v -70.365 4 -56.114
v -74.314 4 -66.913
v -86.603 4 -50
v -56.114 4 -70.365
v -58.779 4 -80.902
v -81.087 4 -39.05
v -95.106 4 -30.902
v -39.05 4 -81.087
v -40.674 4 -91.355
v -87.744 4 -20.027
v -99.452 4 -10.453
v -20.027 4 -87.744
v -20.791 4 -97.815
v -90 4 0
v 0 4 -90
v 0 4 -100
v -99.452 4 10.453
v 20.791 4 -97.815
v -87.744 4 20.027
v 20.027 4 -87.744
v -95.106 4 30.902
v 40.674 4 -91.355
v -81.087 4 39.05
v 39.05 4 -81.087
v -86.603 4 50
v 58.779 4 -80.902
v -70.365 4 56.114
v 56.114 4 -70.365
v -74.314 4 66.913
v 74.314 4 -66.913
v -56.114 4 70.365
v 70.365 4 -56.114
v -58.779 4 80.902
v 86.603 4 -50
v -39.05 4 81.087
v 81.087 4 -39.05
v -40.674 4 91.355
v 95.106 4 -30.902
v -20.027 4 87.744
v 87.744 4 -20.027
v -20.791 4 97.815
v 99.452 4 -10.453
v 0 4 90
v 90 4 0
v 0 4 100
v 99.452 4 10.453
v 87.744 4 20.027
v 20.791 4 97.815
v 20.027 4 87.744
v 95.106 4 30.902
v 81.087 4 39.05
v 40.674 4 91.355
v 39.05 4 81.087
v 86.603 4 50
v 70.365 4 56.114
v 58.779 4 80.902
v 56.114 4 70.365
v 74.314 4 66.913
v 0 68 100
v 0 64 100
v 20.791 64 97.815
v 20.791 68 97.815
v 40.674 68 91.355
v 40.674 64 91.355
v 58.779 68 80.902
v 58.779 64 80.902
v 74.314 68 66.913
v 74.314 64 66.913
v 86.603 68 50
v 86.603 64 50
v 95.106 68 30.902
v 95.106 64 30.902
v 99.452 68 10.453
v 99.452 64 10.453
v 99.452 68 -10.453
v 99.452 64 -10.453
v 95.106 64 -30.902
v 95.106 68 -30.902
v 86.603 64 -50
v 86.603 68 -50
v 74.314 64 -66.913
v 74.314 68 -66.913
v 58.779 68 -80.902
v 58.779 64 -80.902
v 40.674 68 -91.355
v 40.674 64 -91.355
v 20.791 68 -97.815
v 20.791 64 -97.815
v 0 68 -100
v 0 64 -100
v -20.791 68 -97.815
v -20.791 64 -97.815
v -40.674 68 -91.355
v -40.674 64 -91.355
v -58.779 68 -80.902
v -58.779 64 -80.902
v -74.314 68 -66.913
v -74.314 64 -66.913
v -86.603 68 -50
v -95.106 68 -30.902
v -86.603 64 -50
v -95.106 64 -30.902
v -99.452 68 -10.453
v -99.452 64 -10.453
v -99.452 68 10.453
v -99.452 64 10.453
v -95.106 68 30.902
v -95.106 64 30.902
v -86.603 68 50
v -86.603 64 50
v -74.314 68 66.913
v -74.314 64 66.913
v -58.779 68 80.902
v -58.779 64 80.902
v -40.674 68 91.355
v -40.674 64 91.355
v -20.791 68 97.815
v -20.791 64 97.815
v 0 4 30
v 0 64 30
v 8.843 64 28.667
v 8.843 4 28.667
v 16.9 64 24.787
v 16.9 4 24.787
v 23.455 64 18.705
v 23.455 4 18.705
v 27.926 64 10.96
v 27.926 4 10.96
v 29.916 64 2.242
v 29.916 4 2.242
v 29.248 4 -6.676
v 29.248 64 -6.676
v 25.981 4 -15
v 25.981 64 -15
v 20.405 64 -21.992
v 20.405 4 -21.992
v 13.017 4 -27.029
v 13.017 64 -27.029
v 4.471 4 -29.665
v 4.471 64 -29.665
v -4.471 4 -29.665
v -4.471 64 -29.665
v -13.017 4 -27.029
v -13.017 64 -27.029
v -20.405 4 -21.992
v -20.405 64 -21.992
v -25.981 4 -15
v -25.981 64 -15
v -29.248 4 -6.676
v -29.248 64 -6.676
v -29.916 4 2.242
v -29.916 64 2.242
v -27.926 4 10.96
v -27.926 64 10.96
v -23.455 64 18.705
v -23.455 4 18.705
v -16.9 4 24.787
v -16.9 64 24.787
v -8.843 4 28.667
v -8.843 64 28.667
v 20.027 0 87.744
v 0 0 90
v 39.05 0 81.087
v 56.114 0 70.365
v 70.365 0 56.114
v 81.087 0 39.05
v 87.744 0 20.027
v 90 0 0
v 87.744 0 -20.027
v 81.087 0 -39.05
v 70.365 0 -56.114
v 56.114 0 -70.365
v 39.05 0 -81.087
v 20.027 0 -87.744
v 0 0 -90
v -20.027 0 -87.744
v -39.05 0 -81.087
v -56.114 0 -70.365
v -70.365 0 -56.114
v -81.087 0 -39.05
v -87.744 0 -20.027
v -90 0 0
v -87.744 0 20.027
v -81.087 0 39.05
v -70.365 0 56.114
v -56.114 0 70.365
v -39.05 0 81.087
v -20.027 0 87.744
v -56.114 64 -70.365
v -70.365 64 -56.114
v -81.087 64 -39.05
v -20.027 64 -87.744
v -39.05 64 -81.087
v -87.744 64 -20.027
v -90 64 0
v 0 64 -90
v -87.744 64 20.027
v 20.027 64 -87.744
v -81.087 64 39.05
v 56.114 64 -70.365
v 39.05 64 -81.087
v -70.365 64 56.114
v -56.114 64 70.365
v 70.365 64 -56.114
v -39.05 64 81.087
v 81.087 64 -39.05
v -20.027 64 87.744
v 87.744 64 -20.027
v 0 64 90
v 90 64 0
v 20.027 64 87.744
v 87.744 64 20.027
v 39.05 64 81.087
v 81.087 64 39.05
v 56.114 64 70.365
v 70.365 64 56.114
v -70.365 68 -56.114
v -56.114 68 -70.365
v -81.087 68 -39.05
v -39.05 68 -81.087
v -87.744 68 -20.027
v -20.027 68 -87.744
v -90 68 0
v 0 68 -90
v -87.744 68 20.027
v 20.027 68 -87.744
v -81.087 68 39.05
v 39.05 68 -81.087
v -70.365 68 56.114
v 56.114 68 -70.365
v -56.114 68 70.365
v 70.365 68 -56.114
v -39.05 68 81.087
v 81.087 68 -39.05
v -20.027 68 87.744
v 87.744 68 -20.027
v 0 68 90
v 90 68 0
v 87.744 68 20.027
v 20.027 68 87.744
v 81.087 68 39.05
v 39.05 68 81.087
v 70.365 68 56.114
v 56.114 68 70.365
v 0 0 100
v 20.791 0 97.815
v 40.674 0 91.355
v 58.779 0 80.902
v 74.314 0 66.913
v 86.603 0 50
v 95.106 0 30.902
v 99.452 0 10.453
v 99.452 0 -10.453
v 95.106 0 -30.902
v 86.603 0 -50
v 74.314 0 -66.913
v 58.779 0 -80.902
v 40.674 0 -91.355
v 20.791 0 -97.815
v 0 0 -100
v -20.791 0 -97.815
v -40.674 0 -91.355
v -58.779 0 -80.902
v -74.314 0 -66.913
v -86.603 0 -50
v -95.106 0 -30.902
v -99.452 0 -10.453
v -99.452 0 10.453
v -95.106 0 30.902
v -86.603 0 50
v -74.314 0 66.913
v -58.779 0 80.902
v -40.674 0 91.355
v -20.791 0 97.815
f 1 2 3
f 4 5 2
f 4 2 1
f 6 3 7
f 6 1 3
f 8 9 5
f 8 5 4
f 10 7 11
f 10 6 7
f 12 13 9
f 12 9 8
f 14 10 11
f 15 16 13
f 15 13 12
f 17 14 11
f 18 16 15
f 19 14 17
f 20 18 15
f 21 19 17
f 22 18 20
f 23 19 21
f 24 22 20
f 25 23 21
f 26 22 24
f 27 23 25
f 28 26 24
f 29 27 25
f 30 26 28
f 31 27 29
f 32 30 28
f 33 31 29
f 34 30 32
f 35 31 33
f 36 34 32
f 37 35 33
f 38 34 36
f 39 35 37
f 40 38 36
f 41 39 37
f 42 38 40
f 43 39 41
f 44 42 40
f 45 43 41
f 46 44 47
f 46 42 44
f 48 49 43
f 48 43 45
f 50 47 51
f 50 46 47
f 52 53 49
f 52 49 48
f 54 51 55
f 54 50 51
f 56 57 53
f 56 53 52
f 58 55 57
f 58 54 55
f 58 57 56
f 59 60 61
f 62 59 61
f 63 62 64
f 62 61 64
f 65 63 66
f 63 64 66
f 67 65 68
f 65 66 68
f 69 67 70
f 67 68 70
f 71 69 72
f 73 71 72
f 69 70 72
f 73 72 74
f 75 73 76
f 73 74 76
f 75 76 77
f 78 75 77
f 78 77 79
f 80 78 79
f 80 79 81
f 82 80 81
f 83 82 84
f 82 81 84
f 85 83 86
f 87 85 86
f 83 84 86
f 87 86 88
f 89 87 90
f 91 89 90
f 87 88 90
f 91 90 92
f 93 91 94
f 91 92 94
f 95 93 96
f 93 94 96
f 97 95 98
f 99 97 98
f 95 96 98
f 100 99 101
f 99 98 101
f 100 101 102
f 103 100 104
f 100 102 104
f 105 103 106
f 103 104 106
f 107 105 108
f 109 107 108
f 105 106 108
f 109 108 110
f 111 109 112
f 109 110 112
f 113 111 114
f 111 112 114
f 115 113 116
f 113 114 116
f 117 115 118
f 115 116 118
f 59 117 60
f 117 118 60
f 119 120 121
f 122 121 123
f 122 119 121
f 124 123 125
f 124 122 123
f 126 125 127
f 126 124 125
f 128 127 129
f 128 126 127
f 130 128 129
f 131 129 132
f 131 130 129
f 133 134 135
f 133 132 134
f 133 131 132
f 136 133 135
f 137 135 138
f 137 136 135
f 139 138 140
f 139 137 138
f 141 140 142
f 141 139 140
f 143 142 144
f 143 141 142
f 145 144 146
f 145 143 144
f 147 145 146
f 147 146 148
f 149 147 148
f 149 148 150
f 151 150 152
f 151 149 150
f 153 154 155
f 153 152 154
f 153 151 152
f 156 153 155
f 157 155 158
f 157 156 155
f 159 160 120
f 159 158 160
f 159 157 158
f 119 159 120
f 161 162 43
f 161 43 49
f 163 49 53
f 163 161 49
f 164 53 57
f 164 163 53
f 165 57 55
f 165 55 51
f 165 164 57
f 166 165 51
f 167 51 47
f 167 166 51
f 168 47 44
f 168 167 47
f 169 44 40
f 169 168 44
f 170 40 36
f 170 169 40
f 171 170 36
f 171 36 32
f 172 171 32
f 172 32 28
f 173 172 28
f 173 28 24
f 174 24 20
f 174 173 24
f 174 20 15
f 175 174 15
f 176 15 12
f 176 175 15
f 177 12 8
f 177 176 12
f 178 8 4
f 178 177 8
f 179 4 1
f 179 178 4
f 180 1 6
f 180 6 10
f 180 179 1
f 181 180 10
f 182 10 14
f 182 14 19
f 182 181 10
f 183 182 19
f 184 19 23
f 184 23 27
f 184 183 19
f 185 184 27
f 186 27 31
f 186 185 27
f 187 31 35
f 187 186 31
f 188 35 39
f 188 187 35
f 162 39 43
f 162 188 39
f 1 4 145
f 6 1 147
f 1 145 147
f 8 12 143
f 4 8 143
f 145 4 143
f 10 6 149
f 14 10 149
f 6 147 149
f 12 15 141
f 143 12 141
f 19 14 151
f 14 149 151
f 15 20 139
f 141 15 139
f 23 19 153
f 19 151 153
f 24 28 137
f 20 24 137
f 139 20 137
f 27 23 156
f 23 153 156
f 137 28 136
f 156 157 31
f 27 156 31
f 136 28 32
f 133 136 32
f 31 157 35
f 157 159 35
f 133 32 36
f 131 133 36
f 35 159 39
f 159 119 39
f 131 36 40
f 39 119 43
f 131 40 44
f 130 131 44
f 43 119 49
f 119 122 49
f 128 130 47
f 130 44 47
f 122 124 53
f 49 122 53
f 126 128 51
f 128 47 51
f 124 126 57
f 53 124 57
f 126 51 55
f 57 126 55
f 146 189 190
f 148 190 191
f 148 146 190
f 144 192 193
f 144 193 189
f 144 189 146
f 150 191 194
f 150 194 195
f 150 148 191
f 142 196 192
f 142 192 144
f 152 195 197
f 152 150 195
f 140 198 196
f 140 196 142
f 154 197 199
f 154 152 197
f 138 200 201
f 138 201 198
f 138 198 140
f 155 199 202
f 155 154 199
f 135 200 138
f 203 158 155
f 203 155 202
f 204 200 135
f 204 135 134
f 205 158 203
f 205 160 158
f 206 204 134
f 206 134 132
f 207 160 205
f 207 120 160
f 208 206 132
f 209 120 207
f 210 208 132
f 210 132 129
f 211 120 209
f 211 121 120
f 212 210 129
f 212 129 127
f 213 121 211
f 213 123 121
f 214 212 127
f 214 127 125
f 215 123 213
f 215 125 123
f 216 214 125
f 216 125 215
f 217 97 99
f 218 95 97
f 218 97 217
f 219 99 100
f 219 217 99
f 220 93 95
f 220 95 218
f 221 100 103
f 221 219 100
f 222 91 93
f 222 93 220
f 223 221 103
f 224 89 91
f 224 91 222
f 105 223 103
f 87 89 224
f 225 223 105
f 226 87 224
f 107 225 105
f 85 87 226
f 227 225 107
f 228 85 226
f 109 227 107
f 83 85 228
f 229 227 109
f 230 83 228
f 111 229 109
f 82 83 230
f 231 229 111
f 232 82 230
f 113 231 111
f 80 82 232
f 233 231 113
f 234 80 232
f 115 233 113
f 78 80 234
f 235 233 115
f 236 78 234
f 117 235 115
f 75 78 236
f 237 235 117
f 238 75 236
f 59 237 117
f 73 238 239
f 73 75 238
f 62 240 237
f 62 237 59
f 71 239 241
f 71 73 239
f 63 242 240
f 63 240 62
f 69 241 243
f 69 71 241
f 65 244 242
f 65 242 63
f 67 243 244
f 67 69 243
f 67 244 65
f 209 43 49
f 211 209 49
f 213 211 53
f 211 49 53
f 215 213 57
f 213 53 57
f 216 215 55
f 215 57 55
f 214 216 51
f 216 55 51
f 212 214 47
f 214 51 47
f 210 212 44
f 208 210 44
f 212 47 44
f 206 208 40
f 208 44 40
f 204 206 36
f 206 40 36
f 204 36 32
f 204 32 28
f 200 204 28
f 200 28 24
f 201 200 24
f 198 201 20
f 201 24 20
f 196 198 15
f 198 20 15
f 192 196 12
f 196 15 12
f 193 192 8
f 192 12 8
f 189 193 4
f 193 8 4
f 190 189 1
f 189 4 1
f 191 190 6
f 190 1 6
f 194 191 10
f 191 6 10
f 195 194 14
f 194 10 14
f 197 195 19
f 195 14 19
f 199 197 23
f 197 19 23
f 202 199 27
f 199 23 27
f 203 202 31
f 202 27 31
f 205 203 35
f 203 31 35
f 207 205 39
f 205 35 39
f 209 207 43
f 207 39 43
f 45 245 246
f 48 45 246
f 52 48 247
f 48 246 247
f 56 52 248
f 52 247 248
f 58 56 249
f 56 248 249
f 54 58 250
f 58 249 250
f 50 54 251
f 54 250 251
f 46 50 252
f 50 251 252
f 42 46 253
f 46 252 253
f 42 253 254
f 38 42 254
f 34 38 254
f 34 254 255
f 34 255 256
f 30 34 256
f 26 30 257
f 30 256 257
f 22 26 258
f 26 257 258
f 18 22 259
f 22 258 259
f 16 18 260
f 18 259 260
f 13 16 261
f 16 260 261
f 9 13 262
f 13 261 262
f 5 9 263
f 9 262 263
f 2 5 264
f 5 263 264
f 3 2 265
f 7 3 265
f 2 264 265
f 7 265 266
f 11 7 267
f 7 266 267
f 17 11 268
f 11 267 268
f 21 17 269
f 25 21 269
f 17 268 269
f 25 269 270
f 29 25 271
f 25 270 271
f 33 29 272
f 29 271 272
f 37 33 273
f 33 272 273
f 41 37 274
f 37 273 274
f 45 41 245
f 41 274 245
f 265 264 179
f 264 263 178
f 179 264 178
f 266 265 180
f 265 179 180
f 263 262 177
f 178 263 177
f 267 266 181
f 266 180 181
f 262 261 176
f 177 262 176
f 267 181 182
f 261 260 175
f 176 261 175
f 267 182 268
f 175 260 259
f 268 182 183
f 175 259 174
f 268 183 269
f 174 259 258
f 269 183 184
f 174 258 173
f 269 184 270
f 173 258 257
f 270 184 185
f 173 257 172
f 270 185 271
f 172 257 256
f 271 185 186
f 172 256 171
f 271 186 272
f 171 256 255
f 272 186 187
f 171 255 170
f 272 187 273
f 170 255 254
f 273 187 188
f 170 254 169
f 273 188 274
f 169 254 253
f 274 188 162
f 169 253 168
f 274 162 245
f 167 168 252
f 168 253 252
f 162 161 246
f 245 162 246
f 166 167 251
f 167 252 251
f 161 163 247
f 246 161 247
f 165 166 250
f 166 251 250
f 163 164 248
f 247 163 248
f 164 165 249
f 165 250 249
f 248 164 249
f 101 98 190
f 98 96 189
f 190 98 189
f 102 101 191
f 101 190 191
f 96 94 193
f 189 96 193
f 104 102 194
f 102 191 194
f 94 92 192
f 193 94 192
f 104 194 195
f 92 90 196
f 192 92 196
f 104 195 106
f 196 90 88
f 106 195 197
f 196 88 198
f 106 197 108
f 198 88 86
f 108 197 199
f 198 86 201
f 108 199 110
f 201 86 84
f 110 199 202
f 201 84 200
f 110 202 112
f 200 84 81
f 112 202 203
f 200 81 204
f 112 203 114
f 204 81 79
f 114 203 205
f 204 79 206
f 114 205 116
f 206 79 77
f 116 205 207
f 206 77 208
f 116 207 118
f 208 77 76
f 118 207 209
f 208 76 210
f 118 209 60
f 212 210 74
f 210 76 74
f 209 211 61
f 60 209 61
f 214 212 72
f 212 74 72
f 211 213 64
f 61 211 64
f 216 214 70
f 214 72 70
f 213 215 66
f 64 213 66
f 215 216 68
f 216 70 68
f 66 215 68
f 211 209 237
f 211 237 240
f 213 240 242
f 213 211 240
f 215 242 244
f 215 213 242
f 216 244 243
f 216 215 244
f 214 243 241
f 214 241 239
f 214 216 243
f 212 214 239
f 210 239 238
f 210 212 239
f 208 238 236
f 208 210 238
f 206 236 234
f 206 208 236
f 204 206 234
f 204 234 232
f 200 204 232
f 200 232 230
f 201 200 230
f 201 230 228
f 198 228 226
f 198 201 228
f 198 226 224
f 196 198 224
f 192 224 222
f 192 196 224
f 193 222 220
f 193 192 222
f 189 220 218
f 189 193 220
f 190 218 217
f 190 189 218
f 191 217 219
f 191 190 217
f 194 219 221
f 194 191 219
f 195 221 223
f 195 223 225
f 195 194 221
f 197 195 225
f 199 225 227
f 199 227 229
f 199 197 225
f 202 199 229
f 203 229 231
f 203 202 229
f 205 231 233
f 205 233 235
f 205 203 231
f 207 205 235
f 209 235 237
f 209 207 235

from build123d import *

# Parameters (mm, degrees)
SKETCH1_R           = 100
SKETCH1_R_2         = 90
BOSS_EXTRUDE1_DEPTH = 4
SKETCH2_R           = 90
SKETCH2_R_2         = 30
BOSS_EXTRUDE2_DEPTH = 60
SKETCH3_R           = 100
SKETCH3_R_2         = 30
BOSS_EXTRUDE3_DEPTH = 4
CUT_EXTRUDE1_START  = -4
SKETCH4_R           = 90
CUT_EXTRUDE1_DEPTH  = 4


with BuildPart() as part:
    # Sketch1 → Boss-Extrude1 (new body)
    with BuildSketch(Plane(origin=(0, 0, 0), x_dir=(1, 0, 0), z_dir=(0, 1, 0))):
        with Locations(Location((0, 0, 0), (0, 0, 270))):
            Circle(SKETCH1_R)
        with Locations(Location((0, 0, 0), (0, 0, 270))):
            Circle(SKETCH1_R_2, mode=Mode.SUBTRACT)
    extrude(amount=BOSS_EXTRUDE1_DEPTH)


with BuildPart() as body_2:
    # Sketch2 → Boss-Extrude2 (new body)
    with BuildSketch(Plane(origin=(0, 4, 0), x_dir=(1, 0, 0), z_dir=(0, 1, 0))):
        with Locations(Location((0, 0, 0), (0, 0, 270))):
            Circle(SKETCH2_R)
        with Locations(Location((0, 0, 0), (0, 0, 270))):
            Circle(SKETCH2_R_2, mode=Mode.SUBTRACT)
    extrude(amount=BOSS_EXTRUDE2_DEPTH)

    # Sketch3 → Boss-Extrude3 (add)
    with BuildSketch(Plane(origin=(0, 64, 0), x_dir=(1, 0, 0), z_dir=(0, 1, 0))):
        with Locations(Location((0, 0, 0), (0, 0, 270))):
            Circle(SKETCH3_R)
        with Locations(Location((0, 0, 0), (0, 0, 270))):
            Circle(SKETCH3_R_2, mode=Mode.SUBTRACT)
    extrude(amount=BOSS_EXTRUDE3_DEPTH)

    # Sketch4 → Cut-Extrude1 (cut)
    with BuildSketch(Plane(origin=(0, 68, 0), x_dir=(1, 0, 0), z_dir=(0, 1, 0)).offset(CUT_EXTRUDE1_START)):
        with Locations(Location((0, 0, 0), (0, 0, 270))):
            Circle(SKETCH4_R)
    extrude(amount=CUT_EXTRUDE1_DEPTH, mode=Mode.SUBTRACT)


with BuildPart() as cut_extrude1_piece_1:
    # of the separate pieces the step leaves, piece 1, a body of its own (cut_extrude1_pieces)
    add(body_2.part.solids().sort_by_distance((0, 4, 90))[0])


with BuildPart() as cut_extrude1_piece_2:
    # of the separate pieces the step leaves, piece 2, a body of its own (cut_extrude1_pieces)
    add(body_2.part.solids().sort_by_distance((0, 64, 100))[0])


solid = Compound([part.part, cut_extrude1_piece_1.part, cut_extrude1_piece_2.part])
